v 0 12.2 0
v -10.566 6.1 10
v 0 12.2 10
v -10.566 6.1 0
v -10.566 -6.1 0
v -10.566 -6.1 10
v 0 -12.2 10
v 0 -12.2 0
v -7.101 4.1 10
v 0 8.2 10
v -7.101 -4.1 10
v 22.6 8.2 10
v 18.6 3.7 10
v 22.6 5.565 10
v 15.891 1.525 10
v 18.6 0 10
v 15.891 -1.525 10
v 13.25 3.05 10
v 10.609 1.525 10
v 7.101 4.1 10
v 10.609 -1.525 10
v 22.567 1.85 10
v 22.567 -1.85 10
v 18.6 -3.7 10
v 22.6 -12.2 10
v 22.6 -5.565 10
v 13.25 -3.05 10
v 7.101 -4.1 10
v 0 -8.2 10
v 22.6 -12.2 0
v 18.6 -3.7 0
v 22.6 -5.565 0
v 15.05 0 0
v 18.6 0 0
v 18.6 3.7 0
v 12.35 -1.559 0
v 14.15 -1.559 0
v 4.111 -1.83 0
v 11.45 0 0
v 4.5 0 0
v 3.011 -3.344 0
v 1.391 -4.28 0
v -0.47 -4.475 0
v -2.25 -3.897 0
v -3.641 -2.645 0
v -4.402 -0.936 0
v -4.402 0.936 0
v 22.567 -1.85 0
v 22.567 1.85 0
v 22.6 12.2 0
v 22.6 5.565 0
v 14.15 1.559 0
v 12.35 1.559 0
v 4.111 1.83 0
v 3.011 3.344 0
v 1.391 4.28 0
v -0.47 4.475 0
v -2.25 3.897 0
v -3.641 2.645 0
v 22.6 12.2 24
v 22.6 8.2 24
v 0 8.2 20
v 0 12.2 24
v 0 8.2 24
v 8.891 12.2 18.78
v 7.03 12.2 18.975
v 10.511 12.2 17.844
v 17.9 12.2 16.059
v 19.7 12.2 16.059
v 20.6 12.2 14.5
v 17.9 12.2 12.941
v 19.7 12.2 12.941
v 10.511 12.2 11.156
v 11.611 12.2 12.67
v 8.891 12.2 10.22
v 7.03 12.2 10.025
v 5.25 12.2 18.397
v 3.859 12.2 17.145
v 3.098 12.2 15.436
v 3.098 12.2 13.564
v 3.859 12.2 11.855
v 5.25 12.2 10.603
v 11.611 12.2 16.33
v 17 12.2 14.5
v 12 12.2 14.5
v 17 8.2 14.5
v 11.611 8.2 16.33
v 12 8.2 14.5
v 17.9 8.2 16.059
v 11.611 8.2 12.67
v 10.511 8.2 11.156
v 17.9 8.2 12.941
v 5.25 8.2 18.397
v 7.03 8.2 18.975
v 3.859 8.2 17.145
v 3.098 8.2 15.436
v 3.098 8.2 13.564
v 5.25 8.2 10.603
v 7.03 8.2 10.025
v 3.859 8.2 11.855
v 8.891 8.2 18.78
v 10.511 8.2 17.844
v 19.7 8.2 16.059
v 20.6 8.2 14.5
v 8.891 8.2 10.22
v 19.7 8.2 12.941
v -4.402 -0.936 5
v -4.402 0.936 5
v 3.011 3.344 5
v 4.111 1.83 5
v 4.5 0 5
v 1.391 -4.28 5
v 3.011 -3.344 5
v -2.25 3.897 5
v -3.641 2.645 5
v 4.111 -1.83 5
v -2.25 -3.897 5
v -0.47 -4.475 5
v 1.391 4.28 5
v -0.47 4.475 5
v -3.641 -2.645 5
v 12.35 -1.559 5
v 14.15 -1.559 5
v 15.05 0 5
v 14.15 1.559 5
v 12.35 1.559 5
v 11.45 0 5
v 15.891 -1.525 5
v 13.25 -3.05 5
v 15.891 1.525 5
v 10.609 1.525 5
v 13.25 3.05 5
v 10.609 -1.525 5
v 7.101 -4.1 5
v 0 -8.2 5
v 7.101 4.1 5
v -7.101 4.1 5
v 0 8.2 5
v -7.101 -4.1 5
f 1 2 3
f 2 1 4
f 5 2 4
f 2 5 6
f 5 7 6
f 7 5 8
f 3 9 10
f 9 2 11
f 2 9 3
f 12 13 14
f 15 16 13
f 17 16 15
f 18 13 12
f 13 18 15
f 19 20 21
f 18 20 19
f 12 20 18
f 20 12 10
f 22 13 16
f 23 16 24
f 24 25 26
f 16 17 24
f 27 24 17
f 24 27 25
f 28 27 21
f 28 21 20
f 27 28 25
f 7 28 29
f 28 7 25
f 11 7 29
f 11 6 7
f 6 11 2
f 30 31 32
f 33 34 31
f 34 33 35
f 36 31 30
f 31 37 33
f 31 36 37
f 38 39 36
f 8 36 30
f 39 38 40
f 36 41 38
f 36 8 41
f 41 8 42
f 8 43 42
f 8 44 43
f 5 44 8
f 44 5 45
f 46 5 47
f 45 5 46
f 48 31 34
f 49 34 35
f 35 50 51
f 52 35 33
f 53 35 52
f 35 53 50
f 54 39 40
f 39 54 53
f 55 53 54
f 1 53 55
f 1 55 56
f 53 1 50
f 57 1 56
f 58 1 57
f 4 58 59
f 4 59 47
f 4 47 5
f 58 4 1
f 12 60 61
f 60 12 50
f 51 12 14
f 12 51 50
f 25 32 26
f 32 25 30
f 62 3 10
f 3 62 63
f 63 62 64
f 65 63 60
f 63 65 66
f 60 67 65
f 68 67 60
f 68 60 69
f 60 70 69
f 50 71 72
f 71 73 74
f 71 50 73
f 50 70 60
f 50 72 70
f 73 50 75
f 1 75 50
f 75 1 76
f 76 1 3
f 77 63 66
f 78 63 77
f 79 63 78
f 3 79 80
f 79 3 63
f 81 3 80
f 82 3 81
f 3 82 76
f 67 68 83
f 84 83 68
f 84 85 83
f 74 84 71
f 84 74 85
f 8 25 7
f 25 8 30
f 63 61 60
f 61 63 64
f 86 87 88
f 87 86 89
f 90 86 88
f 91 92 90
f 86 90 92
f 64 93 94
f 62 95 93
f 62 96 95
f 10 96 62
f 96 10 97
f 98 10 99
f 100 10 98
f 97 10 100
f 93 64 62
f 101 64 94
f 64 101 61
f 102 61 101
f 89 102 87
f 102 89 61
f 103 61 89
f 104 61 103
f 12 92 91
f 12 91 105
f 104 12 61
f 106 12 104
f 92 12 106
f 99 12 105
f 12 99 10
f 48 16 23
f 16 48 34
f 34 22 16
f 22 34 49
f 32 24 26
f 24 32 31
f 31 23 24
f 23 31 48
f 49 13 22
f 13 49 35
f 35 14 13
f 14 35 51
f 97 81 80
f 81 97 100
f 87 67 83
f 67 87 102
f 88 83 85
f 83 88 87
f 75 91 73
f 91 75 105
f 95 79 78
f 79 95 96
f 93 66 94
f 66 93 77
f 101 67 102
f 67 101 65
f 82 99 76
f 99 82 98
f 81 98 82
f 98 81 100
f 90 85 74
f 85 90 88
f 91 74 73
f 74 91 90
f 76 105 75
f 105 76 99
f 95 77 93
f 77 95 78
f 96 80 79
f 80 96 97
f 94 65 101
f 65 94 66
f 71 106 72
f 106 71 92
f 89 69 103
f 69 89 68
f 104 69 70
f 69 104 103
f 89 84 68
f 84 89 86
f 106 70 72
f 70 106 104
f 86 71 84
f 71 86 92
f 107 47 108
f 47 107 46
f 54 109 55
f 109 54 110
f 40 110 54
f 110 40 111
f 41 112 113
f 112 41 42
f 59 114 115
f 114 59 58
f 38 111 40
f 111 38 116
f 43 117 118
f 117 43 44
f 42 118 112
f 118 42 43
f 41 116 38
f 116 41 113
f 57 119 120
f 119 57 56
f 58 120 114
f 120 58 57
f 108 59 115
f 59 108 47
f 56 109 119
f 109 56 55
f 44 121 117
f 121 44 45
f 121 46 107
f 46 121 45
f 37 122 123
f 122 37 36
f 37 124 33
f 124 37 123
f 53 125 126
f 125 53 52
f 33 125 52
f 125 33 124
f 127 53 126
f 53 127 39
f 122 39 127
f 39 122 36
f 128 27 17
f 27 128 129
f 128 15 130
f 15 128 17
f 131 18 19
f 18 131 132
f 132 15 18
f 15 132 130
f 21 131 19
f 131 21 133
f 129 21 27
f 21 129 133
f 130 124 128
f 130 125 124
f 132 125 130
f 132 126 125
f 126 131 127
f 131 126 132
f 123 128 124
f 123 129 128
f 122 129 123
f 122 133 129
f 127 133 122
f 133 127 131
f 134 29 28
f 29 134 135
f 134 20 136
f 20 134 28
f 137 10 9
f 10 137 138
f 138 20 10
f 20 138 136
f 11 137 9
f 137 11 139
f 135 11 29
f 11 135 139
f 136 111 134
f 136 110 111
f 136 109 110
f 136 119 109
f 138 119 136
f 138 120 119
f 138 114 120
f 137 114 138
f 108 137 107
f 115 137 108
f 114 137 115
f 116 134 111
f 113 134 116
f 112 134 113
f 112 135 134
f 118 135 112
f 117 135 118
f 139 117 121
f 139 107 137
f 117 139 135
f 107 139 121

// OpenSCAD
// file: functions.scad
// PRUSA Mendel  
// Functions used in many files
// GNU GPL v2
// Josef Průša
// josefprusa@me.com
// prusadjs.cz
// http://www.reprap.org/wiki/Prusa_Mendel
// http://github.com/prusajr/PrusaMendel

module nut(d,h,horizontal=true){
cornerdiameter =  (d / 2) / cos (180 / 6);
cylinder(h = h, r = cornerdiameter, $fn = 6);
if(horizontal){
for(i = [1:6]){
	rotate([0,0,60*i]) translate([-cornerdiameter-0.2,0,0]) rotate([0,0,-45]) cube(size = [2,2,h]);
}}
}

// By nophead
module polyhole(d,h) {
    n = max(round(2 * d),3);
    rotate([0,0,180])
        cylinder(h = h, r = (d / 2) / cos (180 / n), $fn = n);
}




module roundcorner(diameter){
	difference(){
		cube(size = [diameter,diameter,99], center = false);
		translate(v = [diameter, diameter, 0]) cylinder(h = 100, r=diameter, center=true);
	}
}
// file: metric.scad
// PRUSA Mendel  
// Default metric sizes
// GNU GPL v2
// Josef Průša
// josefprusa@me.com
// prusadjs.cz
// http://www.reprap.org/wiki/Prusa_Mendel
// http://github.com/prusajr/PrusaMendel

// DONT CHANGE THIS FILE! ALTER VALUES IN CONFIGURATION.SCAD INSTEAD

// RODS

threaded_rod_diameter = 8.2;
threaded_rod_diameter_horizontal = 8.2;
smooth_bar_diameter = 8;
smooth_bar_diameter_horizontal = 8.5;

// Nuts and bolts

m8_diameter = 9;
m8_nut_diameter = 16.4;

m4_diameter = 4.5;
m4_nut_diameter = 9;

m3_diameter = 3.6;
m3_nut_diameter = 6.1;

// Bushing holder

bushing_core_diameter = smooth_bar_diameter;
bushing_material_thickness = 1;

// Motors

motor_shaft = 5.5;
// file: configuration.scad
// PRUSA Mendel  
// Configuration file
// GNU GPL v2
// Josef Průša
// josefprusa@me.com
// prusadjs.cz
// http://www.reprap.org/wiki/Prusa_Mendel
// http://github.com/prusajr/PrusaMendel

// PLEASE SELECT ONE OF THE CONFIGURATIONS BELOW
// BY UN-COMMENTING IT

// Uncomment for metric settings
// METRIC METRIC METRIC METRIC METRIC METRIC METRIC METRIC 

include <metric.scad>;

// Uncomment for imperial settings
// IMPERIAL IMPERIAL IMPERIAL IMPERIAL IMPERIAL IMPERIAL IMPERIAL 

//include <sae.scad>;


// CUSTOM CUSTOM CUSTOM CUSTOM CUSTOM CUSTOM CUSTOM CUSTOM CUSTOM

thin_wall = 3;

// LM8UU
linear =0;


// CHANGE ONLY THE STUFF YOU KNOW
// IT WILL REPLACE DEFAULT SETTING

// RODS

// threaded_rod_diameter = 0;
// threaded_rod_diameter_horizontal = 0;
// smooth_bar_díameter = 0;
// smooth_bar_díameter_horizontal = 0;

// Nuts and bolts

// m8_diameter = 0;
// m8_nut_diameter = 0;

// m4_diameter = 0;
// m4_nut_diameter = 0;

// m3_diameter = 0;
// m3_nut_diameter = 0;

// Bushing holder

// bushing_core_diameter = smooth_bar_díameter;
// bushing_material_thickness = 0;


///counted stuff
m3_nut_diameter_bigger = ((m3_nut_diameter  / 2) / cos (180 / 6))*2;

// functions 
include <functions.scad>
// main file
// PRUSA Mendel  
// Configuration test
// GNU GPL v2
// Josef Průša
// josefprusa@me.com
// prusadjs.cz
// http://www.reprap.org/wiki/Prusa_Mendel
// http://github.com/prusajr/PrusaMendel
include <configuration.scad>

/**
 * @id calibration
 * @name Configuration test
 */
module configurationtest(){
difference(){
	union(){
		rotate(a=[0,0,30]) cylinder(h = 10, r=(m8_nut_diameter/2)+4, $fn =6);
		translate(v=[(((m8_diameter/2)+3)*2+(m3_diameter/2)+2+(((m3_diameter/2)+2)*2)/2)/2,0,5]) cube(size = [((m8_diameter/2)+3)*2+(m3_diameter/2)+2+(((m3_diameter/2)+2)*2)/2,((m8_nut_diameter/2)+4)*2,10], center = true);

		translate(v=[((m8_diameter/2)+3),(m8_nut_diameter/2)+2,((m8_diameter)+15)/2]) cube(size = [((m8_diameter/2)+3)*2,4,(m8_diameter)+15], center = true);
		//translate(v=[(m8_diameter/2)+3,(m8_nut_diameter/2)+4,(m8_diameter/2)+10]) rotate(a=[90,0,0])cylinder(h = 4, r=(m8_diameter/2)+3);

		translate(v=[((m8_diameter/2)+3)*2+(m3_diameter/2)+1.9,(m8_nut_diameter/2)+2,((m8_diameter)+15)/2]) cube(size = [((m3_diameter/2)+2.1)*2,4,(m8_diameter)+15], center = true);
		//translate(v=[((m8_diameter/2)+3)*2+(m3_diameter/2)+2,(m8_nut_diameter/2)+4,(m8_diameter/2)+10]) rotate(a=[90,0,0])cylinder(h = 4, r=(m3_diameter/2)+2);
	}
	translate(v=[(m8_diameter/2)+3,(m8_nut_diameter/2)+5,(m8_diameter/2)+10]) rotate(a=[90,0,0])cylinder(h = 6, r=(m8_diameter/2));
	translate(v=[((m8_diameter/2)+3)*2+(m3_diameter/2)+2,(m8_nut_diameter/2)+5,(m8_diameter/2)+10]) rotate(a=[90,0,0])cylinder(h = 6, r=(m3_diameter/2));
	translate(v=[0,0,-1]) cylinder(h = 15, r=(m8_diameter/2));
	translate(v=[(m8_nut_diameter/2)+(m3_nut_diameter/2)+2,0,-1]) cylinder(h = 15, r=(m3_diameter/2));
	translate(v=[(m8_nut_diameter/2)+(m3_nut_diameter/2)+2,0,5]) rotate(a=[0,0,30]) cylinder(h = 15, r=(m3_nut_diameter/2), $fn =6);
	rotate(a=[0,0,30]) translate(v=[0,0,5]) cylinder(h = 15, r=(m8_nut_diameter/2), $fn =6);

	translate(v=[((m8_diameter/2)+3)*2+(m3_diameter/2)+2+(((m3_diameter/2)+2)*2)/2-4,0,0]) rotate(a=[0,0,-25])difference(){
 	translate(v=[0,0,-1])cube(size = [10,10,20]);
 	rotate(a=[0,0,50]) translate(v=[0,0,-1.5]) cube(size = [30,30,21]);}
	
	translate(v=[((m8_diameter/2)+3)*2+(m3_diameter/2)+2+(((m3_diameter/2)+2)*2)/2-4,-3.7,0]) rotate(a=[0,0,-25])difference(){
 	translate(v=[0,0,-1])cube(size = [10,10,20]);
 	rotate(a=[0,0,50]) translate(v=[0,0,-1.5]) cube(size = [30,30,21]);}
	
	translate(v=[((m8_diameter/2)+3)*2+(m3_diameter/2)+2+(((m3_diameter/2)+2)*2)/2-4,3.7,0]) rotate(a=[0,0,-25])difference(){
 	translate(v=[0,0,-1])cube(size = [10,10,20]);
 	rotate(a=[0,0,50]) translate(v=[0,0,-1.5]) cube(size = [30,30,21]);}
	}
}
configurationtest();
